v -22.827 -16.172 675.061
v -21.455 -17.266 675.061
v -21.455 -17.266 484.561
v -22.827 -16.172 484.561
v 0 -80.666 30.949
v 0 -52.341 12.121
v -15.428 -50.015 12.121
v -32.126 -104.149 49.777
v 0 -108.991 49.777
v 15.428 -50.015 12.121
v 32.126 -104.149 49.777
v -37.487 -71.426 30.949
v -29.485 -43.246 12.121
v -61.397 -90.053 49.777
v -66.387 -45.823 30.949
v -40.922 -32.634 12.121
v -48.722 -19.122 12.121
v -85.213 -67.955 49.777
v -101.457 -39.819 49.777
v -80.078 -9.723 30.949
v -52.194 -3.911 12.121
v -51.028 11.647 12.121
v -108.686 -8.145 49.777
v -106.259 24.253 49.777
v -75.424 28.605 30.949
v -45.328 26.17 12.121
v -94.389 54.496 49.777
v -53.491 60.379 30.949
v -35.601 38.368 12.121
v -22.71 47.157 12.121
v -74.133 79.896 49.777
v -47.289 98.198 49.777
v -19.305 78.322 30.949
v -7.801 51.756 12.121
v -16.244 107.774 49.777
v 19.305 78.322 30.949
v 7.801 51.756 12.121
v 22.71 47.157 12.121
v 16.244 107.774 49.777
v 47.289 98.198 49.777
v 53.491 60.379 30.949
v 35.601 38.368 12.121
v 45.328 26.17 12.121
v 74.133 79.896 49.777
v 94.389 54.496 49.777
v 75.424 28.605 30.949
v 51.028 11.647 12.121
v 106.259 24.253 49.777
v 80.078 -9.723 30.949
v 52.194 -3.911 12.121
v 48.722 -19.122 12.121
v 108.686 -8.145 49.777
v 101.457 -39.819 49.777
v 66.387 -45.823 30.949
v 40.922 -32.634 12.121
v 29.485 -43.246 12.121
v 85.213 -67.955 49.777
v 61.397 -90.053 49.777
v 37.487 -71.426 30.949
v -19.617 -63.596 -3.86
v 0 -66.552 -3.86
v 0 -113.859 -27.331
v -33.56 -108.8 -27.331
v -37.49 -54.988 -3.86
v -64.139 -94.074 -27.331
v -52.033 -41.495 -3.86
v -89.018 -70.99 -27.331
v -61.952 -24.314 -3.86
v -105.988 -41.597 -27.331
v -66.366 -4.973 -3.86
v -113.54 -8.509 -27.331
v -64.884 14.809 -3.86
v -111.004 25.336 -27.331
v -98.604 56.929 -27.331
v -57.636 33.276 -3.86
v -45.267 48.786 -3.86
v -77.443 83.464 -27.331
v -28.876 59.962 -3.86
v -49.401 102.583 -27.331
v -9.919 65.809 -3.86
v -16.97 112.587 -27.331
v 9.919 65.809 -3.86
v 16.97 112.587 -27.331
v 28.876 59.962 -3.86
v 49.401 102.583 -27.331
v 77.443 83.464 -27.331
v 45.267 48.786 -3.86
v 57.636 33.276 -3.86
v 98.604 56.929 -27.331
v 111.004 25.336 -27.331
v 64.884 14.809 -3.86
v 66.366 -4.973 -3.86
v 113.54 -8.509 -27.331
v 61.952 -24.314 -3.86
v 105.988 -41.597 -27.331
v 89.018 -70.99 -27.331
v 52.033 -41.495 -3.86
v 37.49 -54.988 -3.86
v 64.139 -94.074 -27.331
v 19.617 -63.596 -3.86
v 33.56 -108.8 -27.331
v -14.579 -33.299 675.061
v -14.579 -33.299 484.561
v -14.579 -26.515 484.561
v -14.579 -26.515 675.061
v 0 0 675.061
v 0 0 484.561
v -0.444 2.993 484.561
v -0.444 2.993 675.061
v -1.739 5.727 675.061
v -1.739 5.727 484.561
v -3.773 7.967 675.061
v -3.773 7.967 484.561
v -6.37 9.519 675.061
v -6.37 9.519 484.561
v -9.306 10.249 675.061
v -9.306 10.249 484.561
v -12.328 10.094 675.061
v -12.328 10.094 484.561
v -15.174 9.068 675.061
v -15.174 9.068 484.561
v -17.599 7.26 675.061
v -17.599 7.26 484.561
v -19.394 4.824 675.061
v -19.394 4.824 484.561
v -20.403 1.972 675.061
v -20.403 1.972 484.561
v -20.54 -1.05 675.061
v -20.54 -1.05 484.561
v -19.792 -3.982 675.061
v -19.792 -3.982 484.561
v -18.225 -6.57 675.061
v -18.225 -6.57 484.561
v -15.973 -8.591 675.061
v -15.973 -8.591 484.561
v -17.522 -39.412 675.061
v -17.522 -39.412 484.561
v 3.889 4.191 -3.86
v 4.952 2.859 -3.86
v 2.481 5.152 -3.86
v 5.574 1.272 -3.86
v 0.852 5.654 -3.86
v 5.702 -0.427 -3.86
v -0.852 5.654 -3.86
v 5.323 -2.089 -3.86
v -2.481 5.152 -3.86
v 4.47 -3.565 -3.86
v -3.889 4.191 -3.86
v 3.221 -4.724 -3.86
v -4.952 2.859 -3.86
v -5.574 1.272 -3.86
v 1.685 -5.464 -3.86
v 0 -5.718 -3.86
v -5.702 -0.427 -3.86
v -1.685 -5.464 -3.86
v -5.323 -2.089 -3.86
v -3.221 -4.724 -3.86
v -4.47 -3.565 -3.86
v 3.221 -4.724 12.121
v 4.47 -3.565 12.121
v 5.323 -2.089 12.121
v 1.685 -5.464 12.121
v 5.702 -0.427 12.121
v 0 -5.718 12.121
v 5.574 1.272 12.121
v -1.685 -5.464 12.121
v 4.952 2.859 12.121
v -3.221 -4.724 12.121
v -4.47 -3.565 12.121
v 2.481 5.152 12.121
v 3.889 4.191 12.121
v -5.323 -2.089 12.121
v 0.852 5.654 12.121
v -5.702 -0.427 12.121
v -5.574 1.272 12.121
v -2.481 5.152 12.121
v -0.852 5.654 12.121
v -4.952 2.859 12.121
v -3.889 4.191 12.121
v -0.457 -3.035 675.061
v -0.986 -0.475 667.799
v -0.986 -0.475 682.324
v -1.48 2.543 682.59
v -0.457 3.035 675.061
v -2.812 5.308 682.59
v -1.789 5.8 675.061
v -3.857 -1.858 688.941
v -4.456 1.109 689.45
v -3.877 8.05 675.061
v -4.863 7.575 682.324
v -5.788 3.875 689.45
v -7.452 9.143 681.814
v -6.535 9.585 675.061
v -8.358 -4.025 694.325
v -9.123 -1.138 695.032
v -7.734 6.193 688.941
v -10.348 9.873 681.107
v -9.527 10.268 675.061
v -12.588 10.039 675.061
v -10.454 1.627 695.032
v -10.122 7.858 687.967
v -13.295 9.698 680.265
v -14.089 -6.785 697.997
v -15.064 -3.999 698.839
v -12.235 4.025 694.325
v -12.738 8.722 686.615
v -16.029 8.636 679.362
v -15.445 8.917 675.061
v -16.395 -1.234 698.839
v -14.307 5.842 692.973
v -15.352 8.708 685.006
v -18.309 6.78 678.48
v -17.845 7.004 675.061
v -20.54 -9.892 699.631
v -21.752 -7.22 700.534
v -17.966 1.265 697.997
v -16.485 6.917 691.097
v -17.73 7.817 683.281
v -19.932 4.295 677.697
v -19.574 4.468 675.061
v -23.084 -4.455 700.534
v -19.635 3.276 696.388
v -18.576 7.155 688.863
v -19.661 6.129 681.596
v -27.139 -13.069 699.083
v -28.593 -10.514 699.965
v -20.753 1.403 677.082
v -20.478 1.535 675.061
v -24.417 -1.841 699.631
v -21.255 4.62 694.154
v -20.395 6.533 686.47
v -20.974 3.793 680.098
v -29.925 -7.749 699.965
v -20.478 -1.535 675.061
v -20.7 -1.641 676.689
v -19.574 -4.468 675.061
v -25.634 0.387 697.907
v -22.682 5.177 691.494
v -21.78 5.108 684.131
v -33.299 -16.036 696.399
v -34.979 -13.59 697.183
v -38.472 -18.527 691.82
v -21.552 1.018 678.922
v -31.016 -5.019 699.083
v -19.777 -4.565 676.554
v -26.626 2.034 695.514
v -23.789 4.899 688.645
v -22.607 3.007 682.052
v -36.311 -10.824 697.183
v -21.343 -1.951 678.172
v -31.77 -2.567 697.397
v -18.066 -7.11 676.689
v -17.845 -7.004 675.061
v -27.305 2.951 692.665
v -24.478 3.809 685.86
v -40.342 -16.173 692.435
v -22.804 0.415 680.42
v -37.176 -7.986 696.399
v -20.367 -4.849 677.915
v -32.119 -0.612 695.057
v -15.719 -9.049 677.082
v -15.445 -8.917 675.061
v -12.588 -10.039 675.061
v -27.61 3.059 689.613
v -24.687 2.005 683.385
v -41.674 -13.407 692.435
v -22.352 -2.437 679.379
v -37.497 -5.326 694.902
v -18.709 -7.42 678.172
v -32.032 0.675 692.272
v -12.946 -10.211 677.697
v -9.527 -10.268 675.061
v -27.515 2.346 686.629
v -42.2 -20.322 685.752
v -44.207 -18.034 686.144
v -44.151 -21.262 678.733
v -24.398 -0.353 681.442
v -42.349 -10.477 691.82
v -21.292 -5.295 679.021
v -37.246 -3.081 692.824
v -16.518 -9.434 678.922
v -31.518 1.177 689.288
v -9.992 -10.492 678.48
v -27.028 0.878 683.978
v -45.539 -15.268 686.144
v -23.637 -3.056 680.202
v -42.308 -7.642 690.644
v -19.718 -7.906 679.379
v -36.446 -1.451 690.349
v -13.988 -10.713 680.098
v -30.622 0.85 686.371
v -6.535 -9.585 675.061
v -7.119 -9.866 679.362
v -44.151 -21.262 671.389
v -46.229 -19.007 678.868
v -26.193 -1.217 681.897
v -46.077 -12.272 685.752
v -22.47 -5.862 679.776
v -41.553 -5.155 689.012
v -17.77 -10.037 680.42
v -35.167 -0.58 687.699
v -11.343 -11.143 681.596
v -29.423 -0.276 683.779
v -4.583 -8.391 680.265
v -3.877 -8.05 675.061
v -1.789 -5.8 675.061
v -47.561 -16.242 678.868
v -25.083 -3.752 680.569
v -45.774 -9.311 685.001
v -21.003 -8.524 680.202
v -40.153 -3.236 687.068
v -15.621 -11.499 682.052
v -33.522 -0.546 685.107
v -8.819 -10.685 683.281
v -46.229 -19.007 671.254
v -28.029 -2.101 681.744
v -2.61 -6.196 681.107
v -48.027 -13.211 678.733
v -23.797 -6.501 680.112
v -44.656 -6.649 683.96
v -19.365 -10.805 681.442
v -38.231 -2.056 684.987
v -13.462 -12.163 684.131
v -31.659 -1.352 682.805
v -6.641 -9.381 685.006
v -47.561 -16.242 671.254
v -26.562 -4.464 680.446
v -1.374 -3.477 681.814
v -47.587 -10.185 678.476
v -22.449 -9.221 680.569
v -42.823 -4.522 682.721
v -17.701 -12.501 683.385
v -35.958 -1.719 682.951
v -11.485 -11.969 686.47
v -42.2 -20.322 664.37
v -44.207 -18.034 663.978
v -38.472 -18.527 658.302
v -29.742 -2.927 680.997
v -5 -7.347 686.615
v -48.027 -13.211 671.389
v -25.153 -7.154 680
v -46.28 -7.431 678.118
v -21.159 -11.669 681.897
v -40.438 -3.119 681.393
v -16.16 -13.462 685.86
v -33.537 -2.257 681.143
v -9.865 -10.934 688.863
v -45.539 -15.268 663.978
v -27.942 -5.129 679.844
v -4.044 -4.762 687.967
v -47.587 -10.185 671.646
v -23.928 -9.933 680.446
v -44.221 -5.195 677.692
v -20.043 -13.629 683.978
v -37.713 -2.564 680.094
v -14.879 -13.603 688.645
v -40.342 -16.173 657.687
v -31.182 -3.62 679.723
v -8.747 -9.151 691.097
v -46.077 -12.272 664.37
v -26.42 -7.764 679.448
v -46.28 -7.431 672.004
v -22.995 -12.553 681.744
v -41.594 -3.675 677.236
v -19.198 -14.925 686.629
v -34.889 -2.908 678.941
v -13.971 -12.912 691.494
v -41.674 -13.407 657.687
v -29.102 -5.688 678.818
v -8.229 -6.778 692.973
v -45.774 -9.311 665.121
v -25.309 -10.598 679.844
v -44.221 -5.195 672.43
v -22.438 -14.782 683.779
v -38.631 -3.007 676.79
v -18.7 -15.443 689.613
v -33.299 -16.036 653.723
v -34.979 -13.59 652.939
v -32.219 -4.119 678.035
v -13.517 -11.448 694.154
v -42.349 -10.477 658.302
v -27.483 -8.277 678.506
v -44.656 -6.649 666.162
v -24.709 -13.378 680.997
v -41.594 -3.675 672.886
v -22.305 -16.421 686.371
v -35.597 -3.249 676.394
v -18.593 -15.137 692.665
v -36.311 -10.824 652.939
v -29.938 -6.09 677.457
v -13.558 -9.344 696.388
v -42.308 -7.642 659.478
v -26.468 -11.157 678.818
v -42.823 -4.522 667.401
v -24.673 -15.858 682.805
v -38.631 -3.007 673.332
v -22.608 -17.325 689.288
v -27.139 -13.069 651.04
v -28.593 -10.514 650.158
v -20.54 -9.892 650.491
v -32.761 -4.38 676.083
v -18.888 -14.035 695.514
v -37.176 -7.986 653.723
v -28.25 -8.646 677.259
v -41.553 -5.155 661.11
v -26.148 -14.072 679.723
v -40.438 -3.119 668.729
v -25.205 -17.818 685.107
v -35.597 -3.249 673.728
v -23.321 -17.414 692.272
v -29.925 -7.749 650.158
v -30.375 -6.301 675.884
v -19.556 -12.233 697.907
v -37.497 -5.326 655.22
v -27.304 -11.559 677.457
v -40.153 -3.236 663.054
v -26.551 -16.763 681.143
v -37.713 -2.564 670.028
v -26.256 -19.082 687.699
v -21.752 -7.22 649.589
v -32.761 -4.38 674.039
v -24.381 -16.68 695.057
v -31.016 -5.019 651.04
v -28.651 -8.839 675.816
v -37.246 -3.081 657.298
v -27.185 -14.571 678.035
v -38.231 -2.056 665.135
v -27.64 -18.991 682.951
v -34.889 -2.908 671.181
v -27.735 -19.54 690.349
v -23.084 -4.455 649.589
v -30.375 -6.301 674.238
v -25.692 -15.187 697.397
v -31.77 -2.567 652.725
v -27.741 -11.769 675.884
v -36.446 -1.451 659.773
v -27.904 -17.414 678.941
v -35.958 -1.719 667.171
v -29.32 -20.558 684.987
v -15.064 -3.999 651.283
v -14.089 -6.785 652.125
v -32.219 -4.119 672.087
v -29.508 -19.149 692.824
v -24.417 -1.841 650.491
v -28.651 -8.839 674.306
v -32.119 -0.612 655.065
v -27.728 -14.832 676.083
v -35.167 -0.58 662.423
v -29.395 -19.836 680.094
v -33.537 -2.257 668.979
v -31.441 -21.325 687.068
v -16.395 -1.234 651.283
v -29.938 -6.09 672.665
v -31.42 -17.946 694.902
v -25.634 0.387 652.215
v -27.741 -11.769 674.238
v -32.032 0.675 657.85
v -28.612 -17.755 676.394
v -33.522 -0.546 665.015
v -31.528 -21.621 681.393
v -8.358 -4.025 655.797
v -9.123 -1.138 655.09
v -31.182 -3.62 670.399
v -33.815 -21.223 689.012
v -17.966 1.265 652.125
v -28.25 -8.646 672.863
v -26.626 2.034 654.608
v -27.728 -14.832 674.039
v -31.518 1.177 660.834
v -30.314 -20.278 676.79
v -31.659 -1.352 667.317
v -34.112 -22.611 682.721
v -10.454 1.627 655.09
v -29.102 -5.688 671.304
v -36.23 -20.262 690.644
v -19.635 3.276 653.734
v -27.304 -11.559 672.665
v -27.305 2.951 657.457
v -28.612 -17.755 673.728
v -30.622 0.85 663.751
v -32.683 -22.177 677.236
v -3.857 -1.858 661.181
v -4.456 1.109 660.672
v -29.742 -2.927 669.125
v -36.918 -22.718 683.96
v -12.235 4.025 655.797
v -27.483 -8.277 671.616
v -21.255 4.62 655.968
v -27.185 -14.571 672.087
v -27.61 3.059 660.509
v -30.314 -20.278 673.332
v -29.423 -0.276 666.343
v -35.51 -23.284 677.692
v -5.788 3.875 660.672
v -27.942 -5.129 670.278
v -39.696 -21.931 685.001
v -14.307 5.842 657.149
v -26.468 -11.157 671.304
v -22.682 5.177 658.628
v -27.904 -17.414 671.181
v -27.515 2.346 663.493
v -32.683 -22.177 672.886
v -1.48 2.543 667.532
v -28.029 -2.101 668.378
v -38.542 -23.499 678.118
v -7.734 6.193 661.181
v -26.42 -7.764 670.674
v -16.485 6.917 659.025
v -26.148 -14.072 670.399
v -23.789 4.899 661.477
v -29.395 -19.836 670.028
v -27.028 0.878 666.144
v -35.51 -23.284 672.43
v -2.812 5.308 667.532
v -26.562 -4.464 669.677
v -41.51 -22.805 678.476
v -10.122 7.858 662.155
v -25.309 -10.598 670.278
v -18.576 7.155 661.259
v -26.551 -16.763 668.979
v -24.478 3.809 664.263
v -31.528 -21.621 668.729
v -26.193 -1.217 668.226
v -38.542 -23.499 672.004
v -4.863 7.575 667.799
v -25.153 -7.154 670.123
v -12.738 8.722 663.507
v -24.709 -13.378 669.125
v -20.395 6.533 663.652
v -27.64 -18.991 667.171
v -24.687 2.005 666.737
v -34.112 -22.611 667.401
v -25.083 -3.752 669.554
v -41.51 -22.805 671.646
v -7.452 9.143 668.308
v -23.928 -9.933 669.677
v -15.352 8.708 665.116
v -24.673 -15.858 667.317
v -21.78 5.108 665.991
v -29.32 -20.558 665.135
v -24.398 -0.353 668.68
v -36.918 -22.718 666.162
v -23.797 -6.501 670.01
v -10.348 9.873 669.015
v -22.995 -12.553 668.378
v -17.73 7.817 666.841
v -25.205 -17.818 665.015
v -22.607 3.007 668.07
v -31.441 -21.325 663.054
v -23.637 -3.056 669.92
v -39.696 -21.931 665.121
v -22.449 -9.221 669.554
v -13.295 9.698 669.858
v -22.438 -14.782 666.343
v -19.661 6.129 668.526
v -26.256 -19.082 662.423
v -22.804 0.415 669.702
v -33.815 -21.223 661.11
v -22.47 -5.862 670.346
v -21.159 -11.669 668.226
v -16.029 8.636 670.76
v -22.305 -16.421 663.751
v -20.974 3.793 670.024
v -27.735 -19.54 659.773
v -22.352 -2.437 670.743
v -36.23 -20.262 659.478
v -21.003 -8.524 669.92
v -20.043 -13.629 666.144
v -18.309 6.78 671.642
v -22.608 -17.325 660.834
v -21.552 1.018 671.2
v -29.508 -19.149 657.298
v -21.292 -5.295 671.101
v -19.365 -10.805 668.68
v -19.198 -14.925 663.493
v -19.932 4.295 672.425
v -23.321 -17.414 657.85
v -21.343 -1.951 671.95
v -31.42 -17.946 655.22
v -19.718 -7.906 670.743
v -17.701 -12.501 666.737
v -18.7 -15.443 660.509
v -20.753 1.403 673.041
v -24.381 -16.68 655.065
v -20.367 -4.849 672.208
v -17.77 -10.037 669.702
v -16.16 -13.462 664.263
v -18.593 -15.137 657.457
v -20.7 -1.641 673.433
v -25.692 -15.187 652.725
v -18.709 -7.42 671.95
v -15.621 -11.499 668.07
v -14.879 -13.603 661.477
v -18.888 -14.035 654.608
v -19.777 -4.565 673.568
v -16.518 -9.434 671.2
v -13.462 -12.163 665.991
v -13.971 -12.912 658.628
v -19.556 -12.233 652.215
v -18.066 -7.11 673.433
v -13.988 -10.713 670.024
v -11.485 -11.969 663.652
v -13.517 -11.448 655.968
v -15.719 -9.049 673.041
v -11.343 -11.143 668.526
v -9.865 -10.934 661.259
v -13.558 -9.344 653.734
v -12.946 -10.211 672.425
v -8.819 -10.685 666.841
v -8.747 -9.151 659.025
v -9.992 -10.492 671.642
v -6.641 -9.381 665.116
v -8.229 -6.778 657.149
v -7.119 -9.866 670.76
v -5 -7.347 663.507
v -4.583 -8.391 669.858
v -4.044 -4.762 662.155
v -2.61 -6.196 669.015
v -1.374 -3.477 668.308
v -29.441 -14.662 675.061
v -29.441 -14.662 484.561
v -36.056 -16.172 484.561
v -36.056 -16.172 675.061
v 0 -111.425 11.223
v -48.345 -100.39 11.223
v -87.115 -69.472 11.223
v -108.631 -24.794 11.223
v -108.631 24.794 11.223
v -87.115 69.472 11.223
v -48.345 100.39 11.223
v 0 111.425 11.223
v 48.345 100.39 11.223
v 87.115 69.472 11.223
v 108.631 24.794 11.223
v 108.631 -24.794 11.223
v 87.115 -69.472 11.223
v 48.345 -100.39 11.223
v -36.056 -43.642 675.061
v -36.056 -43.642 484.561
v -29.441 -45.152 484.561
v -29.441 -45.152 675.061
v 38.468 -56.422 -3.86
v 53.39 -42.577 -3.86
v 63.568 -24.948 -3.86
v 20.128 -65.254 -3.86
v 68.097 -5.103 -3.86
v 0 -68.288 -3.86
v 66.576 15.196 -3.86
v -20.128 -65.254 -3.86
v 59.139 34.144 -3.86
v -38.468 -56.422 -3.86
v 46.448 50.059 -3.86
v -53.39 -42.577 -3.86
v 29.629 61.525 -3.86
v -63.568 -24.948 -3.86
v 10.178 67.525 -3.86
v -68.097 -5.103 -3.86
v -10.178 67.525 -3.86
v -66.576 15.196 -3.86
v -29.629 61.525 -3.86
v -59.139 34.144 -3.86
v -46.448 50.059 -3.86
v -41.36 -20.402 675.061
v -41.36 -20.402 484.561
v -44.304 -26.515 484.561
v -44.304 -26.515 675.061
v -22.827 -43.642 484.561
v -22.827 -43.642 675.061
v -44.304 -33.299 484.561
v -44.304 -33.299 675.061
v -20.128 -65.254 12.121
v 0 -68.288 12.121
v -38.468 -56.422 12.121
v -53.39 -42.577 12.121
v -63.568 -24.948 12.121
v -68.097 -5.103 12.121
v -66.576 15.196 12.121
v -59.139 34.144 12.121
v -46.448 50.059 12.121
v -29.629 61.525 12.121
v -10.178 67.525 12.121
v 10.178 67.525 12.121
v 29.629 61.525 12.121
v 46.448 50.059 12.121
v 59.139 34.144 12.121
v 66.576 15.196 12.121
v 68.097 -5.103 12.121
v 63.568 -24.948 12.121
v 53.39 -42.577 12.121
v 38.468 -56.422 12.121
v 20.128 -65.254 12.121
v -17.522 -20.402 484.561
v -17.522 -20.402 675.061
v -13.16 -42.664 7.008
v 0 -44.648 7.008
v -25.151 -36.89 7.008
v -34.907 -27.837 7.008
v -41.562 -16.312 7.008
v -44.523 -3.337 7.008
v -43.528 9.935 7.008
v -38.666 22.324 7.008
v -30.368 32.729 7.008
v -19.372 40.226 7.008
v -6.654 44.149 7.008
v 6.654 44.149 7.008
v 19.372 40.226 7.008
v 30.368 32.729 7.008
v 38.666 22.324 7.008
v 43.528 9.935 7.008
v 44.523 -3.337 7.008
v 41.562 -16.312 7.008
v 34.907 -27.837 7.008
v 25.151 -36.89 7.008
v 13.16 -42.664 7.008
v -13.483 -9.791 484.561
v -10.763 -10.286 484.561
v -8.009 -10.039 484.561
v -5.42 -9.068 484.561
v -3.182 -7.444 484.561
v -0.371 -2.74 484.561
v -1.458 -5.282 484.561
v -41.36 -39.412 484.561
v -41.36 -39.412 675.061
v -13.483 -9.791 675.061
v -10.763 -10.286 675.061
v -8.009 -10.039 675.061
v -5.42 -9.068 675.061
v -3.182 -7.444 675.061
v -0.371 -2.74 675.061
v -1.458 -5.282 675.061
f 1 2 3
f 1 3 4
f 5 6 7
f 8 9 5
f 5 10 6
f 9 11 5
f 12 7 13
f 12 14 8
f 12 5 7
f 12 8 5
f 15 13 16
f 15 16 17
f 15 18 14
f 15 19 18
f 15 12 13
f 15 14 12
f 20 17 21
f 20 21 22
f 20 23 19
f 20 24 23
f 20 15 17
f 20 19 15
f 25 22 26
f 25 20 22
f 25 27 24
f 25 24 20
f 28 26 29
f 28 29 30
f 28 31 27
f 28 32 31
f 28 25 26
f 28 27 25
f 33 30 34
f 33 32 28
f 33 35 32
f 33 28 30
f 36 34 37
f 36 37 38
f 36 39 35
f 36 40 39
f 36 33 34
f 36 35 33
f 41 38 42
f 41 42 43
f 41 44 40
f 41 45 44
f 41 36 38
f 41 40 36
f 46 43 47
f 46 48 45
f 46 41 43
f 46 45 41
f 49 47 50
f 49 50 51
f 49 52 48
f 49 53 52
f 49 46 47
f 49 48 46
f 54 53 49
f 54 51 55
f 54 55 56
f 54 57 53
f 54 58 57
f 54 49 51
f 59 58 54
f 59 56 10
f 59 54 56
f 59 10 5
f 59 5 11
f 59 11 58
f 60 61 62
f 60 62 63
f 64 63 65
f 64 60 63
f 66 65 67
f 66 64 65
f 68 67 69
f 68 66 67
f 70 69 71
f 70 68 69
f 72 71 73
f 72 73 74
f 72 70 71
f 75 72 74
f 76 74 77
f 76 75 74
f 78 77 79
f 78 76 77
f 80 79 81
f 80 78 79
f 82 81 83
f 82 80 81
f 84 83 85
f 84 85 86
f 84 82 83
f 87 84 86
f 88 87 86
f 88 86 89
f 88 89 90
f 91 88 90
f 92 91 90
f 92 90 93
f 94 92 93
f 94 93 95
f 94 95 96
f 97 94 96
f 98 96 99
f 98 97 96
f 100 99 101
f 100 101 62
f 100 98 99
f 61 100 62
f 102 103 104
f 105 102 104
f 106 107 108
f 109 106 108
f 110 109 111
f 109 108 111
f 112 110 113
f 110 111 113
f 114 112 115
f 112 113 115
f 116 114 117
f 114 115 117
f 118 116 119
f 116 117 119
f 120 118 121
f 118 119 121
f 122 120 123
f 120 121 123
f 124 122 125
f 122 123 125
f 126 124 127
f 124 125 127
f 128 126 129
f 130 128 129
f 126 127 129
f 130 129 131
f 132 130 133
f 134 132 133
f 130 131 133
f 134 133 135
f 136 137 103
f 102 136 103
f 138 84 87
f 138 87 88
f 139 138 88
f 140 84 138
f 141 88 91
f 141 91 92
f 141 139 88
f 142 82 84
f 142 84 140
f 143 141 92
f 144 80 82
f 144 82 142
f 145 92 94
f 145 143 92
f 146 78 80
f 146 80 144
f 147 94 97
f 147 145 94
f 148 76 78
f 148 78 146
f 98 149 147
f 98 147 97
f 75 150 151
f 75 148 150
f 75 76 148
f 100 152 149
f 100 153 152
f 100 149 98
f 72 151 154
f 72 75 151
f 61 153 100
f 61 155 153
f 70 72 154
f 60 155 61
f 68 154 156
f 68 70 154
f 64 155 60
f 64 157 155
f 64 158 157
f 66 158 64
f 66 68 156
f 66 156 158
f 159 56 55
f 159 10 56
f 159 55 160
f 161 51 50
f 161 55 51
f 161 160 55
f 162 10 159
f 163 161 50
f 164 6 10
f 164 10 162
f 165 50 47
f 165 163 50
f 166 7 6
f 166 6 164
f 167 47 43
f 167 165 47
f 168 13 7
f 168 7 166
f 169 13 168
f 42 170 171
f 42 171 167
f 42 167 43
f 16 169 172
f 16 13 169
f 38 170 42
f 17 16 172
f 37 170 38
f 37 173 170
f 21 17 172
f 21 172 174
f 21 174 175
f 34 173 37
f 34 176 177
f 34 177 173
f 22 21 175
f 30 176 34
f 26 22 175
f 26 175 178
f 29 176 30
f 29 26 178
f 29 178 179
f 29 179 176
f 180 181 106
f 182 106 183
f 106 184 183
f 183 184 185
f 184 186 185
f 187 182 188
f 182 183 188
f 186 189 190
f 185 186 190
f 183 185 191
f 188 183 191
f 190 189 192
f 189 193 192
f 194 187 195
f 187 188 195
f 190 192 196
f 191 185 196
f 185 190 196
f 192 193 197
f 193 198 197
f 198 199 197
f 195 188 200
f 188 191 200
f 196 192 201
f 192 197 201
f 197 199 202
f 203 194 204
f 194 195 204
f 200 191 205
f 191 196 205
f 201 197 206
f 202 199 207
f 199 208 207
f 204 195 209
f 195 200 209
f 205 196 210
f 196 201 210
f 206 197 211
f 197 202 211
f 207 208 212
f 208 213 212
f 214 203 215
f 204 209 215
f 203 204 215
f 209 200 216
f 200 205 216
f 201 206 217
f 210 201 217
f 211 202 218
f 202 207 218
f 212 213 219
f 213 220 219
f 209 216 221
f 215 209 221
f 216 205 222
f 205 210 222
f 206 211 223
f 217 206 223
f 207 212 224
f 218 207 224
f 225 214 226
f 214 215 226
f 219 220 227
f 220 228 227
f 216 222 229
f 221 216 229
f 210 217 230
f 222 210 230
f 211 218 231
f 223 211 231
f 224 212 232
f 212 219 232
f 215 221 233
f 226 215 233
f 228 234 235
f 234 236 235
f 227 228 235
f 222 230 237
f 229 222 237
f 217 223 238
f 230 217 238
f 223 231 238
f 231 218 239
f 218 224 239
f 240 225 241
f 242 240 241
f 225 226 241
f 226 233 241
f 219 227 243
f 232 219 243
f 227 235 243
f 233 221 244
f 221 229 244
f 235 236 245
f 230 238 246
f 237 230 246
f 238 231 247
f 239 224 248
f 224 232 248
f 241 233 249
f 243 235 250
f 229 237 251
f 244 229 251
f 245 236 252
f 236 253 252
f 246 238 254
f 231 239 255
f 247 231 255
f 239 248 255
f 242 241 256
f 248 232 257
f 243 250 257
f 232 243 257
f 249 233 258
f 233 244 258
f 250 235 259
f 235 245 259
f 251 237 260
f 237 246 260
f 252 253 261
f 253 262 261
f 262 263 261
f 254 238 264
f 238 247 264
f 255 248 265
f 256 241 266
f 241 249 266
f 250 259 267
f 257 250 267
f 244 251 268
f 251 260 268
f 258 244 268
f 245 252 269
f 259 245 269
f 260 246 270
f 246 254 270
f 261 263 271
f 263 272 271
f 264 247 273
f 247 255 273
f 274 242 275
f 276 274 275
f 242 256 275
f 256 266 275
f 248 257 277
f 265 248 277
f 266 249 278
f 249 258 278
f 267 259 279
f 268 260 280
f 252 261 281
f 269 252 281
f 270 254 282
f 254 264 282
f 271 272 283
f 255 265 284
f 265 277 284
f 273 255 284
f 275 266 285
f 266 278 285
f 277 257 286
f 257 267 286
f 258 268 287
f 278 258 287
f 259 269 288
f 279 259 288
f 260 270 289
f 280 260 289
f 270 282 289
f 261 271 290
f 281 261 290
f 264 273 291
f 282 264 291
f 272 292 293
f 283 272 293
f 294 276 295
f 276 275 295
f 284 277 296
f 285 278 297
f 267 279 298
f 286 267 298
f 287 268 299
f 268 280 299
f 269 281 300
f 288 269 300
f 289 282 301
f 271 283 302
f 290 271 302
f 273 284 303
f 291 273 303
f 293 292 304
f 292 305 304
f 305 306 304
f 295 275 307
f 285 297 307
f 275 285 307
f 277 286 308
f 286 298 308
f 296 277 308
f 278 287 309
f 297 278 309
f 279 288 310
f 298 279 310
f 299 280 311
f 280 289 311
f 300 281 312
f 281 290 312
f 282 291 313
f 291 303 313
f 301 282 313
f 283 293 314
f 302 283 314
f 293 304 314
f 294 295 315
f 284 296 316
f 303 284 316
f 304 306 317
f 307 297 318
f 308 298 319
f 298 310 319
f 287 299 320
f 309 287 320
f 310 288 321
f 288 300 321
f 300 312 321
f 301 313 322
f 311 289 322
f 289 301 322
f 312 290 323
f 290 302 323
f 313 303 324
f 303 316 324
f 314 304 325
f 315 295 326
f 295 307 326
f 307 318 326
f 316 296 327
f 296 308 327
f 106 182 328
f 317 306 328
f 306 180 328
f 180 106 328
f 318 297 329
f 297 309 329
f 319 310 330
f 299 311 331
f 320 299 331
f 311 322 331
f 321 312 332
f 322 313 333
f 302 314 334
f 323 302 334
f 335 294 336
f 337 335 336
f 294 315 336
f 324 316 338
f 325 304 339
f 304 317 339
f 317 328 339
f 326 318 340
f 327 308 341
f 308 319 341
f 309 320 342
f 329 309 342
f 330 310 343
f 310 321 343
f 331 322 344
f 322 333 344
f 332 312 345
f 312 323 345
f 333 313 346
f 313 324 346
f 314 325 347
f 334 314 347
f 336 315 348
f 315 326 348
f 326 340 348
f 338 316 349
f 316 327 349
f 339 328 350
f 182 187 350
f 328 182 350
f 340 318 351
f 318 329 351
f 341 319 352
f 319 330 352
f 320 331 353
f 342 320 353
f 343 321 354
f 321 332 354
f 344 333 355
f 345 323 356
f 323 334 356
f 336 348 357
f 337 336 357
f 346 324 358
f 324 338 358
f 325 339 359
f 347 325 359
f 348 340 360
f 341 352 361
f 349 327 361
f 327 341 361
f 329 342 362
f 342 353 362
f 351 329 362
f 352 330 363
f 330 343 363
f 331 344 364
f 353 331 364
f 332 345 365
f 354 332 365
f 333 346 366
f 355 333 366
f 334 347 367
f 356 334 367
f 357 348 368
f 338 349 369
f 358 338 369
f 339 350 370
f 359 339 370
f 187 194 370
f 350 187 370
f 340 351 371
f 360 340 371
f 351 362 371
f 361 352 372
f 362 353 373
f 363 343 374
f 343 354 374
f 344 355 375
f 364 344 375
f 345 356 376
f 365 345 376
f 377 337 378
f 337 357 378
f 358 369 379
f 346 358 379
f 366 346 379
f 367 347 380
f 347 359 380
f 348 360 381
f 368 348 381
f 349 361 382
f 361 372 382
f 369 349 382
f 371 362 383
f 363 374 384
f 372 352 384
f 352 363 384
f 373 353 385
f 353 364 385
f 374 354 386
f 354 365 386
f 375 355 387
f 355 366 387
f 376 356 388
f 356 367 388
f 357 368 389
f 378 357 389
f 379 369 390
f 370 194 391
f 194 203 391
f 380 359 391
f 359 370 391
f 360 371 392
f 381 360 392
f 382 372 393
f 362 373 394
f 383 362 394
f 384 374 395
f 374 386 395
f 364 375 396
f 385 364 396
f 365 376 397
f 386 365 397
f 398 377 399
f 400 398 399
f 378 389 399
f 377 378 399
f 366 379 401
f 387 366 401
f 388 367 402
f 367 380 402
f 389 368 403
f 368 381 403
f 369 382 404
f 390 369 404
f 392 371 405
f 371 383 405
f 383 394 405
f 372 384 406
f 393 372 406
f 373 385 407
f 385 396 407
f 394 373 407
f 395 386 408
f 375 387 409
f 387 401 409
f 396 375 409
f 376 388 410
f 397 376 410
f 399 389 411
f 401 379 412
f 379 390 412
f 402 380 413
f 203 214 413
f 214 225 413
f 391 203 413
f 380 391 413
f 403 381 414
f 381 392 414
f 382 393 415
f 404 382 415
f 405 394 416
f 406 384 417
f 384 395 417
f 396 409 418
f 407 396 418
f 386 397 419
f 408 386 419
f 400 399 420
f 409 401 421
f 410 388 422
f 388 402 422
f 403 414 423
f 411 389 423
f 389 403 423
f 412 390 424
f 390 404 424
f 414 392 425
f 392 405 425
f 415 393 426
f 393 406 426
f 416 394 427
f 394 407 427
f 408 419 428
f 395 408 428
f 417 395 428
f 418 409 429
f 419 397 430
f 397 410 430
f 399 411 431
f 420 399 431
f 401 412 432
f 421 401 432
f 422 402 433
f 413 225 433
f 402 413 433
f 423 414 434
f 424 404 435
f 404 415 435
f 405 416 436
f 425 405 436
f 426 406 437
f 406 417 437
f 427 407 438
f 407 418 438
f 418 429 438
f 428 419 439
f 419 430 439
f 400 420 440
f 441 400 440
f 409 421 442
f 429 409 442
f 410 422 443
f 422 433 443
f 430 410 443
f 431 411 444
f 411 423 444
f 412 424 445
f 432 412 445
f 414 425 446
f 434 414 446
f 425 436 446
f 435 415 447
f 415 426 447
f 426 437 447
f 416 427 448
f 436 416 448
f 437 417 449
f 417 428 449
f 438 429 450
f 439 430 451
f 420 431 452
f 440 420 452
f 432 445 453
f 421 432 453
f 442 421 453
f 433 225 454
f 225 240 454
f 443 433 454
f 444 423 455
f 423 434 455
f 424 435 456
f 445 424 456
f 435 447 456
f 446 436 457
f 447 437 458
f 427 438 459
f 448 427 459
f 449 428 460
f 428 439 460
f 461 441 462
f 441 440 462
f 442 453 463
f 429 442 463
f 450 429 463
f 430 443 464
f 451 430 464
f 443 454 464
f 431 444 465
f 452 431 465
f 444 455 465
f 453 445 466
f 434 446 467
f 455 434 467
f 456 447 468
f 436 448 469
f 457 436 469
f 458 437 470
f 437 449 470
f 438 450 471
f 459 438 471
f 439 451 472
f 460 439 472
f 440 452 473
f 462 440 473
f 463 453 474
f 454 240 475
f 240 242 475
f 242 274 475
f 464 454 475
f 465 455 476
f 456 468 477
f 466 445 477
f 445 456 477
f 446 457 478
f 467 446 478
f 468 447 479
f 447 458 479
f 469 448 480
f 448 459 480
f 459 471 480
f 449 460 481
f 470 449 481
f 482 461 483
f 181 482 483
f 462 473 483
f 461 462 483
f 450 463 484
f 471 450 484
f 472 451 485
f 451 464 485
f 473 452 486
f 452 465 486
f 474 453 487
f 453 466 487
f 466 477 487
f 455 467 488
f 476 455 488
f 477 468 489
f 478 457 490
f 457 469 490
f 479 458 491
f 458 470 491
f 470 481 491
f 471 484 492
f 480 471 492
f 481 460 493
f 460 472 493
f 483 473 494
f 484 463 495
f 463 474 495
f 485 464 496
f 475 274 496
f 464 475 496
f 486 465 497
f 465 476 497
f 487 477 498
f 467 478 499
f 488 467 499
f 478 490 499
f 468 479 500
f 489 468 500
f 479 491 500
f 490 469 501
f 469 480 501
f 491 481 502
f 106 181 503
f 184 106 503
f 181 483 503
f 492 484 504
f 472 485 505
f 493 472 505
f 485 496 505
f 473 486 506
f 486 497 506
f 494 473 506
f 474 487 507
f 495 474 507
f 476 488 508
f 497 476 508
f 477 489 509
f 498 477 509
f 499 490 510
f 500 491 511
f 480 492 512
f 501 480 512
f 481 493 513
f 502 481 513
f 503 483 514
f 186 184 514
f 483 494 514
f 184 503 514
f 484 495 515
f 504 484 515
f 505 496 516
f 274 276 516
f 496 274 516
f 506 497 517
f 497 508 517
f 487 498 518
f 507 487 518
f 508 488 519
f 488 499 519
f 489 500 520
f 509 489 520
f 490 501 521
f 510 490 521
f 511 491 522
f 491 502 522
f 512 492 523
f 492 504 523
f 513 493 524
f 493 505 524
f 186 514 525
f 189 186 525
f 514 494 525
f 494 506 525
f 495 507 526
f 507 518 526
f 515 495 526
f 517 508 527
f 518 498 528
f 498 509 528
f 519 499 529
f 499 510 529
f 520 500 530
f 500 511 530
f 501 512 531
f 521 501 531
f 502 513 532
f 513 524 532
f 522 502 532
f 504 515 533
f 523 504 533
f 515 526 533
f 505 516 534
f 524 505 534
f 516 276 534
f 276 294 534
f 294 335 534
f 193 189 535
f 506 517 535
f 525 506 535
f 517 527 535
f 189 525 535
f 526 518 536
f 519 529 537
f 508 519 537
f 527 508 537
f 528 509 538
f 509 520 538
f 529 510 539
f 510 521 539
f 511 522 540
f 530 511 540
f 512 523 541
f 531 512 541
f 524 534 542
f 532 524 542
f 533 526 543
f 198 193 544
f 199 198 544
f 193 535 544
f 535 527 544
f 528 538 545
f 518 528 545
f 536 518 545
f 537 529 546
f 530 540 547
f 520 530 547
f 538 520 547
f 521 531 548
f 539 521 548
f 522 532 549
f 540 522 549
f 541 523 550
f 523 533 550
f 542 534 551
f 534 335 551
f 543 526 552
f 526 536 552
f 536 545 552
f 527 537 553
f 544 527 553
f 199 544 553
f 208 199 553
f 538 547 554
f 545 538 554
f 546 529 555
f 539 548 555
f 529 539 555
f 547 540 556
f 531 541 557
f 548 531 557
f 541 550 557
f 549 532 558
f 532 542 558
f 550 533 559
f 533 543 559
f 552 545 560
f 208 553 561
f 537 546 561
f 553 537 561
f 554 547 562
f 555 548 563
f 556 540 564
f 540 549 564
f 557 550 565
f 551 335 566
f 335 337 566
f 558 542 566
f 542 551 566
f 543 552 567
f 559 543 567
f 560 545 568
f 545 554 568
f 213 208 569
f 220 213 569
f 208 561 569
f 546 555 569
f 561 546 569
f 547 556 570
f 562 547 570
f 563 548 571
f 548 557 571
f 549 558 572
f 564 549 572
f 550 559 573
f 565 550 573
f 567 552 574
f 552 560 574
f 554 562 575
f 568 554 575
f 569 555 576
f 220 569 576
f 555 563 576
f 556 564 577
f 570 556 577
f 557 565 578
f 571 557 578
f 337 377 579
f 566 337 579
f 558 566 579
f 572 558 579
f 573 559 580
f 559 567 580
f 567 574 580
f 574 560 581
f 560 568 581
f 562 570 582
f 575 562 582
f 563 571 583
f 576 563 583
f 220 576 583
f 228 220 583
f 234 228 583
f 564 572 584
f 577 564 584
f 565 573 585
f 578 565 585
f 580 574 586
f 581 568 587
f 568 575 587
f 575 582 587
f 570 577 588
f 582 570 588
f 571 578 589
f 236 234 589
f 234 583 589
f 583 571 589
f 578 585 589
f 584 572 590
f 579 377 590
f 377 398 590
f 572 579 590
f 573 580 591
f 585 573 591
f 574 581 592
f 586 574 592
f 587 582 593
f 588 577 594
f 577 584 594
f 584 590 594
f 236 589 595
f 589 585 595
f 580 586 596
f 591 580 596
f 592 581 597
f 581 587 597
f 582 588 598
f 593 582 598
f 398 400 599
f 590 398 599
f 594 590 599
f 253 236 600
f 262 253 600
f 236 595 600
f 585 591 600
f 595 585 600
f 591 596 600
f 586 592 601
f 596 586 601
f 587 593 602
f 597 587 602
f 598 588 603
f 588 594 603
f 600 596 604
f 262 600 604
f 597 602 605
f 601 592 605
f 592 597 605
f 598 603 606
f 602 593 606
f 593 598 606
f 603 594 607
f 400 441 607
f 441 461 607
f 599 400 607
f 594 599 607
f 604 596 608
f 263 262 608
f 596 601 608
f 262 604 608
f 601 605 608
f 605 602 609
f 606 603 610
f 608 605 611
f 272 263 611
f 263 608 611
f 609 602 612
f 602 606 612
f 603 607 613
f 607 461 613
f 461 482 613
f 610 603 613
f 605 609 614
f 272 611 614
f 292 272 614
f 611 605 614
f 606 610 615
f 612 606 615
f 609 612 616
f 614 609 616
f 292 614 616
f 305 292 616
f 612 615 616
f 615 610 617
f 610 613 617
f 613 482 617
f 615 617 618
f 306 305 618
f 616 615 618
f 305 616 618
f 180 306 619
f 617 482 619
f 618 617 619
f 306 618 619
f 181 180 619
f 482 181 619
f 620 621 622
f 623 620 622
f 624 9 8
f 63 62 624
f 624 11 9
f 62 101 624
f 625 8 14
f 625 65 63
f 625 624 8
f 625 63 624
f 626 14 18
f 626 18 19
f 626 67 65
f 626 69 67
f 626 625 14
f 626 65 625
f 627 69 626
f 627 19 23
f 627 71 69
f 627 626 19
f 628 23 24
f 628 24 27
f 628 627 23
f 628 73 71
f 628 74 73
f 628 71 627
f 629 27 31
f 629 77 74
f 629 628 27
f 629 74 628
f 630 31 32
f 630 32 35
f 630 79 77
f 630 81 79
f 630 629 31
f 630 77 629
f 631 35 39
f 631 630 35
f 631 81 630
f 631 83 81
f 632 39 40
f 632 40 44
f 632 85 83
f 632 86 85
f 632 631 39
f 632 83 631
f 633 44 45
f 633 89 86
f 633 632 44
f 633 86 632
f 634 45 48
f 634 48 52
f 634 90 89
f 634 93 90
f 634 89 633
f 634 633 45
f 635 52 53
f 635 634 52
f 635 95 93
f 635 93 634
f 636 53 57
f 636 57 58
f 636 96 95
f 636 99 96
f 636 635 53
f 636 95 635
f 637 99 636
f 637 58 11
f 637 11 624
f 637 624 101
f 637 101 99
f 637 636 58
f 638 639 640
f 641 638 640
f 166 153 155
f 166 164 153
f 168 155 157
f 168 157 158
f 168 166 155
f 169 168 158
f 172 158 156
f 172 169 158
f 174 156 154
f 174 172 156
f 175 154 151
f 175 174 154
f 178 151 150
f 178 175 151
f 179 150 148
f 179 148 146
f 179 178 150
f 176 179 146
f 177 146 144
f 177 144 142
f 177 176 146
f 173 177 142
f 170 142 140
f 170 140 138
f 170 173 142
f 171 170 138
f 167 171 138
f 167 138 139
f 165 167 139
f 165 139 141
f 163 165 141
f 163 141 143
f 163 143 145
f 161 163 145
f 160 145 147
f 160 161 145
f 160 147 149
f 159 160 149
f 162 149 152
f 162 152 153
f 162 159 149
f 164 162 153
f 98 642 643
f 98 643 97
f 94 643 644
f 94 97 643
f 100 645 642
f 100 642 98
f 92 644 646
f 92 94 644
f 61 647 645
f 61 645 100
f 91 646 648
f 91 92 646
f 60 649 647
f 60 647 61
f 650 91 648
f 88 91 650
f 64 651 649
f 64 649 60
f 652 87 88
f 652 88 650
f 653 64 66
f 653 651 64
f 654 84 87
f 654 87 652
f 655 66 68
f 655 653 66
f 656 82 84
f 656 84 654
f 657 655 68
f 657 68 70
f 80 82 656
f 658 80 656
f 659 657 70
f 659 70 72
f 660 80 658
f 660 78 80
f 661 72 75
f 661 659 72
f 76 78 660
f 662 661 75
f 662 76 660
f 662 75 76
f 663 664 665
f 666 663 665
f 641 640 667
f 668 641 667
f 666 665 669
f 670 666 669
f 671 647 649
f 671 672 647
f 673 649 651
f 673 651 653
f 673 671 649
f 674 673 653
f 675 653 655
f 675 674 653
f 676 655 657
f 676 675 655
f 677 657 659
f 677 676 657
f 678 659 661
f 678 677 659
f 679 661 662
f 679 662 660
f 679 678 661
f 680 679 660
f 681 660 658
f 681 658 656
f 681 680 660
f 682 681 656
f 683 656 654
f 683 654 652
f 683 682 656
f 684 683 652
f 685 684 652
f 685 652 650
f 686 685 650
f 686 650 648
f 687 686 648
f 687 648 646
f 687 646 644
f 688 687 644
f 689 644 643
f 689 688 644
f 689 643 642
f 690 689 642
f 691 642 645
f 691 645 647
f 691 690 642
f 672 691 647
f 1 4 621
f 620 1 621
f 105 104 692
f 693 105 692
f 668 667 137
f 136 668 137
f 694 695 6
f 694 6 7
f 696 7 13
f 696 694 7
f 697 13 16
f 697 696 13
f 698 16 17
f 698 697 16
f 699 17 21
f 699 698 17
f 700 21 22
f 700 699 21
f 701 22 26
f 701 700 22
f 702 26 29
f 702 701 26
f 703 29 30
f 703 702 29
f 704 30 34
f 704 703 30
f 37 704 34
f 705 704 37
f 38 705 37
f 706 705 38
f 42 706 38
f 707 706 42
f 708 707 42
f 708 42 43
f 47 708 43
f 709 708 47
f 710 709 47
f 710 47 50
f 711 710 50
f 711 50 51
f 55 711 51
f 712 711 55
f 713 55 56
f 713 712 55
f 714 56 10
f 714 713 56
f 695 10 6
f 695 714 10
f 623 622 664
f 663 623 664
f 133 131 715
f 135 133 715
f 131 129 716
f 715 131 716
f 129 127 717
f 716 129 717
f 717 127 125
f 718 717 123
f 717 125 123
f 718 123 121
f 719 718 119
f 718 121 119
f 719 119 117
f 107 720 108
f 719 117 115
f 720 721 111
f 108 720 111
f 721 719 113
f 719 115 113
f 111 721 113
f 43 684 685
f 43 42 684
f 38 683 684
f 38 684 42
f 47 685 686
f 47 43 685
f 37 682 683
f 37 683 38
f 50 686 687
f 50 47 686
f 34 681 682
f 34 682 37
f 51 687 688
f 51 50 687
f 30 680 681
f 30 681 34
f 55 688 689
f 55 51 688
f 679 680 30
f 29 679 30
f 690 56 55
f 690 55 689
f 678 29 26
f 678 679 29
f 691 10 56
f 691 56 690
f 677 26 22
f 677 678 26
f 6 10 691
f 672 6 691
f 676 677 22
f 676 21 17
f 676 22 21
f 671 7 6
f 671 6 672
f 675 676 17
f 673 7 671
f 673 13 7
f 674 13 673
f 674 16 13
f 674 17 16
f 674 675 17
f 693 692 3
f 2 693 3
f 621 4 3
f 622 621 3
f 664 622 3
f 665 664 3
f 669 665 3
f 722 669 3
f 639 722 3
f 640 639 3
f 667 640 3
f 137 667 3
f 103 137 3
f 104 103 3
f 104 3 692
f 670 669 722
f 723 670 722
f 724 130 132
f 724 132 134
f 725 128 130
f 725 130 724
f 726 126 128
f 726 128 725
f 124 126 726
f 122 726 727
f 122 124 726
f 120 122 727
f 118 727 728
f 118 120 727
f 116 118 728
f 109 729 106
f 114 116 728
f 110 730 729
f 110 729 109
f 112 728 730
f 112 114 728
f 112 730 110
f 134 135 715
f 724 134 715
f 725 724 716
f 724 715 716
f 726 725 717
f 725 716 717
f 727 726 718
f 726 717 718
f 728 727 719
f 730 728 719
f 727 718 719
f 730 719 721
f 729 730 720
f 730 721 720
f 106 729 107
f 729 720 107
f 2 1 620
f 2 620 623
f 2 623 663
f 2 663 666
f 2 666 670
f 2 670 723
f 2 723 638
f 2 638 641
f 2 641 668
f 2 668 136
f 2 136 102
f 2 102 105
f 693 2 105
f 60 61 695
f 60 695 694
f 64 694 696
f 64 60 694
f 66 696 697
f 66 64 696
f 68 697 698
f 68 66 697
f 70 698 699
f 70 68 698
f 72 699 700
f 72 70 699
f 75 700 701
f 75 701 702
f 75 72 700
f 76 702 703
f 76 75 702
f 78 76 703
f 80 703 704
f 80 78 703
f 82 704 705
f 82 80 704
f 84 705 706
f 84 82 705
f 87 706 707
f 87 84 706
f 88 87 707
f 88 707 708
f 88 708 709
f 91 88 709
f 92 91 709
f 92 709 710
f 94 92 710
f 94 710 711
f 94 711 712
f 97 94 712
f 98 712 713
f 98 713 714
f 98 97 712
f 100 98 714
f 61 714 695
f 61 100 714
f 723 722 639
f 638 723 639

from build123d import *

# Parameters (mm, degrees)
F5_DEPTH  = 190.5
F5_FACE_R = 10.29673


with BuildPart() as f2:
    # F1 (on Right) → F2 (revolve)
    with BuildSketch(Plane.YZ):
        Polygon((-5.71775, -3.860109), (-5.71775, 12.121061), (-52.340601, 12.121061), (-44.647871, 7.007704), (-66.552435, -3.860109), align=None)
        Polygon((-68.288028, 12.121061), (-52.340601, 12.121061), (-108.991168, 49.776679), (-113.858538, -27.330739), (-66.552435, -3.860109), (-68.288028, -3.860109), align=None)
    revolve(axis=Axis((0, 0, -0.971727), (0, 0, -1)))


with BuildPart() as f5:
    # F4 (on offset) → F5 (new body)
    with BuildSketch(Plane.XY.offset(484.561061)):
        with BuildLine():
            ThreePointArc((-15.973499, -8.590515), (-5.419718, -9.068484), (0, 0))
            ThreePointArc((0, 0), (-15.173743, 9.068484), (-15.973499, -8.590515))
        make_face()
        Polygon((-17.522483, -20.401941), (-21.454777, -17.266041), (-22.826923, -16.171791), (-29.441452, -14.662068), (-36.05598, -16.171791), (-41.36042, -20.401941), (-44.304162, -26.514684), (-44.304162, -33.299318), (-41.36042, -39.412061), (-36.05598, -43.642211), (-29.441452, -45.151934), (-22.826923, -43.642211), (-17.522483, -39.412061), (-14.578741, -33.299318), (-14.578741, -26.514684), align=None)
    extrude(amount=F5_DEPTH)


with BuildPart() as f6:
    # F5_face (on face) → F6 (revolve)
    with BuildSketch(Plane(origin=(-10.29673, 0, 675.061061), x_dir=(1, 0, 0), z_dir=(0, 0, 1))):
        Circle(F5_FACE_R)
    revolve(axis=Axis((-16.050612, -23.458313, 675.061061), (0.433884, -0.900969, 0)))


solid = Compound([f2.part, f5.part, f6.part])
